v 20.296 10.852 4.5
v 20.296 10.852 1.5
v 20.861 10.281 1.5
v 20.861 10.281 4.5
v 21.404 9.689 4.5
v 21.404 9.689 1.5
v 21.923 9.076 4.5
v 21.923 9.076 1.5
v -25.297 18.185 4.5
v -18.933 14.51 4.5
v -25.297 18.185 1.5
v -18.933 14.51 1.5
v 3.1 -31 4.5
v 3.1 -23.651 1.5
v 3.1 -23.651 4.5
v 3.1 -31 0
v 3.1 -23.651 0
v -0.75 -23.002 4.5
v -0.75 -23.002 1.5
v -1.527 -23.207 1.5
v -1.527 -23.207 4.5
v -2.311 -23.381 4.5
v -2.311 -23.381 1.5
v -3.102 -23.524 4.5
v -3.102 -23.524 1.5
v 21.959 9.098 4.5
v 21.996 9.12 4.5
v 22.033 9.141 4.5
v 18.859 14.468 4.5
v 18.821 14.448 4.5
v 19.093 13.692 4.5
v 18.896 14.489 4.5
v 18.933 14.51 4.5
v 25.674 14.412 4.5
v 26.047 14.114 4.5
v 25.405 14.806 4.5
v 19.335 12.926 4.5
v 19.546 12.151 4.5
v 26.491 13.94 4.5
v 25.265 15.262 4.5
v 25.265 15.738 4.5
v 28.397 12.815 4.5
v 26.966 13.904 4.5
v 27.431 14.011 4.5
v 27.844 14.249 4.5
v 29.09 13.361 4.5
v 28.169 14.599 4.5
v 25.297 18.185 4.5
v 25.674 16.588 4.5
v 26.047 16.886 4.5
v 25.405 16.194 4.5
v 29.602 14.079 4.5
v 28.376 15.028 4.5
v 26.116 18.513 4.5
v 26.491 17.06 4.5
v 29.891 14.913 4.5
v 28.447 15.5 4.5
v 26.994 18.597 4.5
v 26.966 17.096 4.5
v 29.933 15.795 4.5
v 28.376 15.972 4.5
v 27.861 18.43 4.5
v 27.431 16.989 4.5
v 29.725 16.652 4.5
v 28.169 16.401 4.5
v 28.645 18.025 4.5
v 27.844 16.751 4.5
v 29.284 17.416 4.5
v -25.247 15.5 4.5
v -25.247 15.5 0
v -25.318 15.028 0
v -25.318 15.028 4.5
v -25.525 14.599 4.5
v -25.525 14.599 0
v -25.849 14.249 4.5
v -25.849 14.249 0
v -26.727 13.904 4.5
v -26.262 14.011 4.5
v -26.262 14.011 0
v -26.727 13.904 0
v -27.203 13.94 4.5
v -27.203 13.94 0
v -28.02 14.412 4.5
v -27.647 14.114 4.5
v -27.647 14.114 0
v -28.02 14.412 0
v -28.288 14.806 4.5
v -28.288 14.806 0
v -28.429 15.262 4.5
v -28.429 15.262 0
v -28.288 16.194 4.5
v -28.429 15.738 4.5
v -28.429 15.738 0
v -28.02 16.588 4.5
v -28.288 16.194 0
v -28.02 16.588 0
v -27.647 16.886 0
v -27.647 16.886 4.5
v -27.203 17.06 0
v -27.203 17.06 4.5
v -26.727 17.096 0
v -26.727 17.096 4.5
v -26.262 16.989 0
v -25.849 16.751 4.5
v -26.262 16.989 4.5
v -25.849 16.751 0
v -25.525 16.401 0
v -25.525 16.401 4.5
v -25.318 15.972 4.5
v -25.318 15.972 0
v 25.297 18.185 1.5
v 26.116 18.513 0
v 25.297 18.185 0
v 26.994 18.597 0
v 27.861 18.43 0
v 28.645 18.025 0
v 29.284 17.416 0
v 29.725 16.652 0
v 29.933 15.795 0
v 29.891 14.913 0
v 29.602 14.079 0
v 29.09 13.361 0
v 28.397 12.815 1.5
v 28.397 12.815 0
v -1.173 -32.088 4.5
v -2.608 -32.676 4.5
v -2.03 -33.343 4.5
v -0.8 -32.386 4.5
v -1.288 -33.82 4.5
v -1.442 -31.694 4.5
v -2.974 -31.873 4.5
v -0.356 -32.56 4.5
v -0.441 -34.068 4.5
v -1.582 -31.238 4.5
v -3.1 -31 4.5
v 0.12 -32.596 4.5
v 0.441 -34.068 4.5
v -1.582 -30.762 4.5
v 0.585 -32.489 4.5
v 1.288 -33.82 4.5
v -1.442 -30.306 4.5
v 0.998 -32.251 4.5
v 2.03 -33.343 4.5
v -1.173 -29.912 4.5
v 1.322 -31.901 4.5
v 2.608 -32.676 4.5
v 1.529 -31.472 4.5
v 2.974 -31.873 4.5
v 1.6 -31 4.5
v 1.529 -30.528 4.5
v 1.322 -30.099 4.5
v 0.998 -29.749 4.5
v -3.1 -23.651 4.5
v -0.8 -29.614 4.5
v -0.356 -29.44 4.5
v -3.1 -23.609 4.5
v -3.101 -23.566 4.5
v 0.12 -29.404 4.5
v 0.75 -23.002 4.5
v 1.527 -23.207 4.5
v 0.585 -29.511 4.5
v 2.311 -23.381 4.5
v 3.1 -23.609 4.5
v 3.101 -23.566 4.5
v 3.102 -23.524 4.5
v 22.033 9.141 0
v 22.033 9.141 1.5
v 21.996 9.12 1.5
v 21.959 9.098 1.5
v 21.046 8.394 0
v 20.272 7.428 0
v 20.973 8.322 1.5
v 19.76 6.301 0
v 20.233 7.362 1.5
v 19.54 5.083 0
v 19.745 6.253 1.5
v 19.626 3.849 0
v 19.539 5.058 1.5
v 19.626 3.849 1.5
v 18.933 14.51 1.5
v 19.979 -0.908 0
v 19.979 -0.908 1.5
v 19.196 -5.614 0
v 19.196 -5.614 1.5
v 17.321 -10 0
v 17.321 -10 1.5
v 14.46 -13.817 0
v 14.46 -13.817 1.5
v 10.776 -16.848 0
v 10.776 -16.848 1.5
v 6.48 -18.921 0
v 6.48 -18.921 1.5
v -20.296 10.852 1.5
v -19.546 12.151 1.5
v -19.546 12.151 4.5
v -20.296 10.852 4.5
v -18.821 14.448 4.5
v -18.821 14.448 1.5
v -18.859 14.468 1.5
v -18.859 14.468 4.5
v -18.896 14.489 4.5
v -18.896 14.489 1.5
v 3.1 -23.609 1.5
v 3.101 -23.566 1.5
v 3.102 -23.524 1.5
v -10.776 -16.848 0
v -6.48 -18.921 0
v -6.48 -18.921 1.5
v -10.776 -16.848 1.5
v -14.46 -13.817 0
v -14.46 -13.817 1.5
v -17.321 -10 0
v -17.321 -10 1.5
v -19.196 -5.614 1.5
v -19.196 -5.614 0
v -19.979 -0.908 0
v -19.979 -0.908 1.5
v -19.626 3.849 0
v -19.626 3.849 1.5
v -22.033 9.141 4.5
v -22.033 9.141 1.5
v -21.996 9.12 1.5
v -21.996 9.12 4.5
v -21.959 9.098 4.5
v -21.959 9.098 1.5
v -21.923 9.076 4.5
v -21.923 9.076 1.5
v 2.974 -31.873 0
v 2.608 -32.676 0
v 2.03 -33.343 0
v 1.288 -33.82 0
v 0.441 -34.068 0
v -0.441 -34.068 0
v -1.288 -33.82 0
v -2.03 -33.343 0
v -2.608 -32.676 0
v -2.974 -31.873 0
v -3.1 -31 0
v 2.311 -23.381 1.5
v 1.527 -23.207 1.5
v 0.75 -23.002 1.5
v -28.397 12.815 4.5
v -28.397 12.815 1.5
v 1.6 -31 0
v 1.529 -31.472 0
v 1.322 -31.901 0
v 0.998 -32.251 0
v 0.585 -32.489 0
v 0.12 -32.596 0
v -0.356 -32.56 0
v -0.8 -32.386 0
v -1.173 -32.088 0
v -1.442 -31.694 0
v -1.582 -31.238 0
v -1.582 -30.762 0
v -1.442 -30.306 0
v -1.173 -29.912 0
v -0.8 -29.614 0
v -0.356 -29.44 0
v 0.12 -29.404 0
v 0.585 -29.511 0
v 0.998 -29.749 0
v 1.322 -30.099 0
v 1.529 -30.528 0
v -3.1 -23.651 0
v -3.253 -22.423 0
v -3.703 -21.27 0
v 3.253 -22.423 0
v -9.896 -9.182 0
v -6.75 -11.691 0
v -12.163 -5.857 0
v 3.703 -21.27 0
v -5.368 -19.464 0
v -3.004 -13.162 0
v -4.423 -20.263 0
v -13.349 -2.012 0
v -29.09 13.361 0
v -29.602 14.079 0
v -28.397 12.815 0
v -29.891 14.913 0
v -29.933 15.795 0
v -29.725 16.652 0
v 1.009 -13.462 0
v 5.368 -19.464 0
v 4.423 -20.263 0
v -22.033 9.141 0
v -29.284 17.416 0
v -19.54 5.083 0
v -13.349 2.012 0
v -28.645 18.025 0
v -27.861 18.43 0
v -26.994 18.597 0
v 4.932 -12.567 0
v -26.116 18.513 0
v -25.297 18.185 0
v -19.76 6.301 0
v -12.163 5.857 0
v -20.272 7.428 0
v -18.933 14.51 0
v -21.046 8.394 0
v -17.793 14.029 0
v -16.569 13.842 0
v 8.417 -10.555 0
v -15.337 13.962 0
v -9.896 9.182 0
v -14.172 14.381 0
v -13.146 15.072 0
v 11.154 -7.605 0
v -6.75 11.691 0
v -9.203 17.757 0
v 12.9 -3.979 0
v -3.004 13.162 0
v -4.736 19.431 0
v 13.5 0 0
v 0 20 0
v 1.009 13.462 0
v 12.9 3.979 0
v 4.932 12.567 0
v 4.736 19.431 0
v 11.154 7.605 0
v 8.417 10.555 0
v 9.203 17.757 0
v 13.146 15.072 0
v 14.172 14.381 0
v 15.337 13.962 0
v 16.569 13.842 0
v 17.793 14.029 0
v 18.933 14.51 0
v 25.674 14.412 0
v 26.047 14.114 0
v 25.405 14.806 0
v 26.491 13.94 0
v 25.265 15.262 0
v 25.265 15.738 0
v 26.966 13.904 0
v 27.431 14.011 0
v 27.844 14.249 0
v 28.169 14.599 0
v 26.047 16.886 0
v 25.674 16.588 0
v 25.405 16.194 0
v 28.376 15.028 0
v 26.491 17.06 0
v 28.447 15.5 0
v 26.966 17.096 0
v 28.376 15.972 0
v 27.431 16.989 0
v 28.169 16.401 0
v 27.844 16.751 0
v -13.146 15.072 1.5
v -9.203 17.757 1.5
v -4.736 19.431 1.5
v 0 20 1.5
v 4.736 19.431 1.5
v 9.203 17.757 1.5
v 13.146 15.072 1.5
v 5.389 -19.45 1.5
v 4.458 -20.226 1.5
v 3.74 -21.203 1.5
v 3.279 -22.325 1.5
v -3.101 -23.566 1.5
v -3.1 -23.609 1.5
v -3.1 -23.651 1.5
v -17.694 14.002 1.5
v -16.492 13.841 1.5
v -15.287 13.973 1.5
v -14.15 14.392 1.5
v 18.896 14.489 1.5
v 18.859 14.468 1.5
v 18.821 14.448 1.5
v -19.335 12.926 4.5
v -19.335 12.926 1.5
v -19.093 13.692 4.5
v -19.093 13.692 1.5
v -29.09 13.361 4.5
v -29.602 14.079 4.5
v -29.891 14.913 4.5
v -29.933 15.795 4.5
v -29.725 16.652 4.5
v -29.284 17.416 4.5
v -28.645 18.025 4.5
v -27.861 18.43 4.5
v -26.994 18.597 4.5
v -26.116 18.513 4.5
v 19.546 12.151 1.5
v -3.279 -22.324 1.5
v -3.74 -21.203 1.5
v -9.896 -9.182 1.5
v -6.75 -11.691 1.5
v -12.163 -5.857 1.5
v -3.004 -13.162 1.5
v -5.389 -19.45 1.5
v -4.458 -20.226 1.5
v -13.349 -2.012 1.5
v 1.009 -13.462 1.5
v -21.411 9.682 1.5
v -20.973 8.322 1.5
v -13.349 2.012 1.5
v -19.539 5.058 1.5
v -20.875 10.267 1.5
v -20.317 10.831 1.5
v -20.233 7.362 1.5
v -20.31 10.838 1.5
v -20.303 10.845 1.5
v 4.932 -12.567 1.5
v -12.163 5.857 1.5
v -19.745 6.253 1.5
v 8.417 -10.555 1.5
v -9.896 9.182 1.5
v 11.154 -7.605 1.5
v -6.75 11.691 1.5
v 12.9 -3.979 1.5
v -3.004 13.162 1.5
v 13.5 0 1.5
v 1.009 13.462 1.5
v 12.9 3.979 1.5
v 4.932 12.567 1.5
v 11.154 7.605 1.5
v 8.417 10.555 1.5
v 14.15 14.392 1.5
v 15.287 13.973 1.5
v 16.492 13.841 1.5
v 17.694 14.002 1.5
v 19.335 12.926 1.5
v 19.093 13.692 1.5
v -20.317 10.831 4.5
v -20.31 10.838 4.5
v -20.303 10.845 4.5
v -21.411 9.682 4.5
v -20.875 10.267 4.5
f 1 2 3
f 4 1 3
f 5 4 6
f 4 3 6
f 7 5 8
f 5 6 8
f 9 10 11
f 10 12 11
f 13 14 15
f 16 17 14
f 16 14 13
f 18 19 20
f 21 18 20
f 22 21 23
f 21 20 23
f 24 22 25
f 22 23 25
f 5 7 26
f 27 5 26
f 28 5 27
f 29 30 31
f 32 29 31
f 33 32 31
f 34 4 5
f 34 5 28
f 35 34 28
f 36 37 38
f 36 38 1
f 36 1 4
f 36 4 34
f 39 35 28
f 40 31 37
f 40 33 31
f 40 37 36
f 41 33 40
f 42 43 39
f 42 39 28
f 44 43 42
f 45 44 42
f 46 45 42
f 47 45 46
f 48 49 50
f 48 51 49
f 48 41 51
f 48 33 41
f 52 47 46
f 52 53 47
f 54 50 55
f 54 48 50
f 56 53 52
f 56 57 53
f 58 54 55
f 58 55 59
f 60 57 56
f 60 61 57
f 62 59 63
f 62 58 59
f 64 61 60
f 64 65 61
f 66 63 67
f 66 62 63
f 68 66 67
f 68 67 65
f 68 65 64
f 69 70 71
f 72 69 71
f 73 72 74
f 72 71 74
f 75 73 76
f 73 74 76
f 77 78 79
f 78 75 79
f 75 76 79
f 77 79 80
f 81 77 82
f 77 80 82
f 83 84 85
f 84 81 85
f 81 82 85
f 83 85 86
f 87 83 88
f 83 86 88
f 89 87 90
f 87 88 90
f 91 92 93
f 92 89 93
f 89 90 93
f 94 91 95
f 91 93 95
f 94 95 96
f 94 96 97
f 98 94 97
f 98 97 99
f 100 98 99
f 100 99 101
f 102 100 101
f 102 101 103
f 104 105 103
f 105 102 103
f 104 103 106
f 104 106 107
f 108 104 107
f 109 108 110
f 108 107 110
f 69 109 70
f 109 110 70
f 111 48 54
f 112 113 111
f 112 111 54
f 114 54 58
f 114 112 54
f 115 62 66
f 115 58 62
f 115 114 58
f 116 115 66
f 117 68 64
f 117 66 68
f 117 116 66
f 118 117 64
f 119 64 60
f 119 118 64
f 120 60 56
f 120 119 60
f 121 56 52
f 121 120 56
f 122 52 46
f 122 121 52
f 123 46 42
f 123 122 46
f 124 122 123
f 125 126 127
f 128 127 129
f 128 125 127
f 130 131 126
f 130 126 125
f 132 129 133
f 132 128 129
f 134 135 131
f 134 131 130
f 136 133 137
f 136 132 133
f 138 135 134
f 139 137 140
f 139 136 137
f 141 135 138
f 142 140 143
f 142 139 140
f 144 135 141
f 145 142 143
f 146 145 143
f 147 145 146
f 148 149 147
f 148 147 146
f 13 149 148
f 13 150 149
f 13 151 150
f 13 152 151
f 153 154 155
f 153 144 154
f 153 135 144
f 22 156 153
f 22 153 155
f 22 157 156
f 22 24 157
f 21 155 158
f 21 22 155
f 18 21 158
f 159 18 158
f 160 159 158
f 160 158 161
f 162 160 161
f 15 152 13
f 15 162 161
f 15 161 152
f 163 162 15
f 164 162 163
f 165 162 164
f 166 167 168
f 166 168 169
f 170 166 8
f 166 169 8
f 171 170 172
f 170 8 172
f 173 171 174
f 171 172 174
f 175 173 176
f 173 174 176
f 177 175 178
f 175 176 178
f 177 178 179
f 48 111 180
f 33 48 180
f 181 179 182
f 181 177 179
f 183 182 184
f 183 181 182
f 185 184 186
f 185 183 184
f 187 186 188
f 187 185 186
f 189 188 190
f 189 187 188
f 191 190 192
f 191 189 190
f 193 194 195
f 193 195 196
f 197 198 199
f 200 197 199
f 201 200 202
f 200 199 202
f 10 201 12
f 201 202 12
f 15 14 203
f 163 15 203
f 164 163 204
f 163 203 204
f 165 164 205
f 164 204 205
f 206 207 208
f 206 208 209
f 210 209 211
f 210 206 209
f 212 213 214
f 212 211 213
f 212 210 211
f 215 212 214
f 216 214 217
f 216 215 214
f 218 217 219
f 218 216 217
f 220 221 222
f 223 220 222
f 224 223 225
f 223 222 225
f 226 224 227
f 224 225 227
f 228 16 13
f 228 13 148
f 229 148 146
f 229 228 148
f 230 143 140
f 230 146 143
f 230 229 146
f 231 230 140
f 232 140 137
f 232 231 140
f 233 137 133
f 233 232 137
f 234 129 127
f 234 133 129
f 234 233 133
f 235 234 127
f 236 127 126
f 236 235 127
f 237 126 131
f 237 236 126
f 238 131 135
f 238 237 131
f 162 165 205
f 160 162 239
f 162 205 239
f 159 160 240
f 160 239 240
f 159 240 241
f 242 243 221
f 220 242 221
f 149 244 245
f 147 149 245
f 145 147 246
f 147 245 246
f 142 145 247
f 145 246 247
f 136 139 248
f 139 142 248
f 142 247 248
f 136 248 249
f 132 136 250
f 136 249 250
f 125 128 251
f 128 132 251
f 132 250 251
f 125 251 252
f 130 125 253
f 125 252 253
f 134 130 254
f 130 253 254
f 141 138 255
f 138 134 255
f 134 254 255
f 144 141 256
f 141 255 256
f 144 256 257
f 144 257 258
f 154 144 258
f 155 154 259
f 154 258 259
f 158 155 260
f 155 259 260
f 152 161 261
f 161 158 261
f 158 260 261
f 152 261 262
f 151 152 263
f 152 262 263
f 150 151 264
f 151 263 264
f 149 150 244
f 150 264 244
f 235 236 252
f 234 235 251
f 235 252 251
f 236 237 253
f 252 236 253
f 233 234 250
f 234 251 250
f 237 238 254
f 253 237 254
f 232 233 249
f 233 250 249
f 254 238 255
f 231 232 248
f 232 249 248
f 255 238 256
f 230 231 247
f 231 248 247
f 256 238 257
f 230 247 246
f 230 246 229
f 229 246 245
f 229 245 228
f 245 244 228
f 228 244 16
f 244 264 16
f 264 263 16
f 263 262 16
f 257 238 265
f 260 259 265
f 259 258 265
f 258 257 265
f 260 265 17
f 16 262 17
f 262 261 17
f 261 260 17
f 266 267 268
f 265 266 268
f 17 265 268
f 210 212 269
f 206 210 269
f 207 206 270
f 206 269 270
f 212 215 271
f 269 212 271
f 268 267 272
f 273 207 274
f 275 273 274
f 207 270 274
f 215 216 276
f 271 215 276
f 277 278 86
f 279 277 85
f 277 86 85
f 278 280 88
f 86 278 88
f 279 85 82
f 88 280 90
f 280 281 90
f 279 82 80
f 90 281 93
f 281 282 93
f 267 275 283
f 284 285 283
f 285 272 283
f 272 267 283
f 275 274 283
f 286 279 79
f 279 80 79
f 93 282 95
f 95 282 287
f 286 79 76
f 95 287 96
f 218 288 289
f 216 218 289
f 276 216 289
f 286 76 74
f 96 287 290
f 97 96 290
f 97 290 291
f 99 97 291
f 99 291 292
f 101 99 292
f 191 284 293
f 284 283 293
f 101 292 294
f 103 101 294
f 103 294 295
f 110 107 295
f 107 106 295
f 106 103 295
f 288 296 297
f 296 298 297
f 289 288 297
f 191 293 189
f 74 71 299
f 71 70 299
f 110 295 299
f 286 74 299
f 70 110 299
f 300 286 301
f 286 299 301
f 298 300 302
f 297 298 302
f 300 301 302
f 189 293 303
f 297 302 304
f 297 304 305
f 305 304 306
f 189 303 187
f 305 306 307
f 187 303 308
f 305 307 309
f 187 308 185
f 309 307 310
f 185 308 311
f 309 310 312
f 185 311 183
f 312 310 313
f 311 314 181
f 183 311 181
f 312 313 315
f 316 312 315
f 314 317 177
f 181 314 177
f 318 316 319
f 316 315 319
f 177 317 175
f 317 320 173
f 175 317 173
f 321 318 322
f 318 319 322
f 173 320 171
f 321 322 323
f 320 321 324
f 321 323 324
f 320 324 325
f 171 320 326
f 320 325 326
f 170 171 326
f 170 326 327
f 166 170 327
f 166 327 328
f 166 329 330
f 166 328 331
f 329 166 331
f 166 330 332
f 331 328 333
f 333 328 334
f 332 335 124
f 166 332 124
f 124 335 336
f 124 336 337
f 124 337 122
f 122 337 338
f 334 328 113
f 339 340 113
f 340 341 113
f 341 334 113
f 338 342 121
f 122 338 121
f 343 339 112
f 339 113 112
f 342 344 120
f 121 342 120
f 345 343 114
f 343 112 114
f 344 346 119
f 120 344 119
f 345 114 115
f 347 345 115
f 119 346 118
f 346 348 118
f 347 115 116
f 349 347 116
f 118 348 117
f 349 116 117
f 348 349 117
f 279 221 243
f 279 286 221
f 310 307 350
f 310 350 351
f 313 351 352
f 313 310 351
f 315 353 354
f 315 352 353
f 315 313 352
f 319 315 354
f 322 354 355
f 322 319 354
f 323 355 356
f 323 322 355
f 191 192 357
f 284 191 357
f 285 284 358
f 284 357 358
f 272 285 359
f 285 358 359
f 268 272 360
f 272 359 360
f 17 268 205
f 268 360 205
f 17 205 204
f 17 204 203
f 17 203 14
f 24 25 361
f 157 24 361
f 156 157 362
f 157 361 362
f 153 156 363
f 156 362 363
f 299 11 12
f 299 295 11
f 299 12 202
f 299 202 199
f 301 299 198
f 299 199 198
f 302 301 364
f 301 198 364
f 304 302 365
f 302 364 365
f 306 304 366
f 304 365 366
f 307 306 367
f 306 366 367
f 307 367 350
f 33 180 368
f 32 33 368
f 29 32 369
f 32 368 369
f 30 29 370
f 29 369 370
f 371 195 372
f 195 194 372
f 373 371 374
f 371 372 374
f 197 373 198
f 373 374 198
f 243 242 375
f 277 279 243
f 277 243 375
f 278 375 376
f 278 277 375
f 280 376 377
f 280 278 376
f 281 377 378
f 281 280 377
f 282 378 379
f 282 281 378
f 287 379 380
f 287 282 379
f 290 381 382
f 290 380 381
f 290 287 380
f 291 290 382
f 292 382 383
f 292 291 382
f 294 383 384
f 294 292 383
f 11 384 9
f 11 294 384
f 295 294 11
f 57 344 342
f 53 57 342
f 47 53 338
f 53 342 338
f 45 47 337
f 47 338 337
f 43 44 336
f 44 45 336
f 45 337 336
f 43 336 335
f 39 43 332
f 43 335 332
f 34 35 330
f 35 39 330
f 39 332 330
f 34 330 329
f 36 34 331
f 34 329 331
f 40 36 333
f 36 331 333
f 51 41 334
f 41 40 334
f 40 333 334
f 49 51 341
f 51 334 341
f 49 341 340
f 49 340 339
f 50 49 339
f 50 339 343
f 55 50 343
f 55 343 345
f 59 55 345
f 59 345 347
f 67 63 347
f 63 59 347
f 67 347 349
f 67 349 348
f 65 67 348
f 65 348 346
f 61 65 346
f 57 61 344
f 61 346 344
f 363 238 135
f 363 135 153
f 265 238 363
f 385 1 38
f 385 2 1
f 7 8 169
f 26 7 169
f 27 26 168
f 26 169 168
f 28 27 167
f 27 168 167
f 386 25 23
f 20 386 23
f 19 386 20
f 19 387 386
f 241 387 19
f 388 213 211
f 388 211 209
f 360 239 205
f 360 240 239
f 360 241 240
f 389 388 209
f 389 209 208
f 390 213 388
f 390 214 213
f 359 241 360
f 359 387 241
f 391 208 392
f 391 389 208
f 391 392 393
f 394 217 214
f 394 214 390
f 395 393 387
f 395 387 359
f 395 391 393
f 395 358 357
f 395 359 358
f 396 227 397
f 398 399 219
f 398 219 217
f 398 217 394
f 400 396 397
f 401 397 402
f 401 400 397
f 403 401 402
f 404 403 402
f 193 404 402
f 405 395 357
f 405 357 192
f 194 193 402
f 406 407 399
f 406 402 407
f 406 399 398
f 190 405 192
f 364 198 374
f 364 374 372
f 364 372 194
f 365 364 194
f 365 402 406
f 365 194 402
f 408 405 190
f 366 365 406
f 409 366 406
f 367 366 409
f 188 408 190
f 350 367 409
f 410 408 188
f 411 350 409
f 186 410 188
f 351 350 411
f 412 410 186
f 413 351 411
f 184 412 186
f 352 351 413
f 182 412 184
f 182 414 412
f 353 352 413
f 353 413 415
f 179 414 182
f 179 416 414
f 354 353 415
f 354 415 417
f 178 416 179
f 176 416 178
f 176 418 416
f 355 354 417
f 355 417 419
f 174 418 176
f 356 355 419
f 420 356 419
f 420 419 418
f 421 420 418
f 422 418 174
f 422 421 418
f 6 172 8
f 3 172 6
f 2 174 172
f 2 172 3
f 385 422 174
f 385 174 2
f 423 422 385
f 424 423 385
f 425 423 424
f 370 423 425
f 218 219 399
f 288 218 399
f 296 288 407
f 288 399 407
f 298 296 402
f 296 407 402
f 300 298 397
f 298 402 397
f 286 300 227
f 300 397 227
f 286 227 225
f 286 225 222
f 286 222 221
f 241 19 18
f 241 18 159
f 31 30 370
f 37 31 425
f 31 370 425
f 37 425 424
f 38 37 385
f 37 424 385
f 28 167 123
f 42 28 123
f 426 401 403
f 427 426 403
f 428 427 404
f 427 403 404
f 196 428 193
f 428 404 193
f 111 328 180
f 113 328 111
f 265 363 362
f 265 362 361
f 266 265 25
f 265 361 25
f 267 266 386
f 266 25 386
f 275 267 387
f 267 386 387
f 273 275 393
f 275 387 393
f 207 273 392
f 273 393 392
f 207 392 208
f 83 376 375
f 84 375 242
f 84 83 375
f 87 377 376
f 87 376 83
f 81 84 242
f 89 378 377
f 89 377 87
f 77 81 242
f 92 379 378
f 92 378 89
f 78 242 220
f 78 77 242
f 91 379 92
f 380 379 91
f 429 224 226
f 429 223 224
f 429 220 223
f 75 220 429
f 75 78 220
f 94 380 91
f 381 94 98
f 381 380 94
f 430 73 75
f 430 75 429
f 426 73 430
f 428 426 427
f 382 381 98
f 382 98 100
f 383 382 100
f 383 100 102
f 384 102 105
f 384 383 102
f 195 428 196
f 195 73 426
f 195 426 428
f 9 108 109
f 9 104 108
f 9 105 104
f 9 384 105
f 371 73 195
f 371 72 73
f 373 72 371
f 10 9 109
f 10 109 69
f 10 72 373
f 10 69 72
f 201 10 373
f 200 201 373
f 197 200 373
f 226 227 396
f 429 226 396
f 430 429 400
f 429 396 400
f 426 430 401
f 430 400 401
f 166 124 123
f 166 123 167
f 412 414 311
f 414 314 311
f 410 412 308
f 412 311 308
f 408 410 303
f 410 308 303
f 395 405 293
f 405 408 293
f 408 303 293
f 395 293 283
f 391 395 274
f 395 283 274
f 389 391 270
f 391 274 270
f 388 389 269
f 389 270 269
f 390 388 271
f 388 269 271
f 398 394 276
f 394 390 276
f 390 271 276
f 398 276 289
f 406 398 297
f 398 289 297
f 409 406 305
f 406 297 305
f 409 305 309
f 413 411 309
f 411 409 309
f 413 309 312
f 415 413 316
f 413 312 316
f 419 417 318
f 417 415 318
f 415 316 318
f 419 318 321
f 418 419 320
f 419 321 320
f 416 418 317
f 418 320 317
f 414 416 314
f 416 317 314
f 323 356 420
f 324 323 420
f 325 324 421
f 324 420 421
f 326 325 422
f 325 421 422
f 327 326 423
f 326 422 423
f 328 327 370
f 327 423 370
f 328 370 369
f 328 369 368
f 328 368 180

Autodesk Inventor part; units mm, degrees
ref_plane "YZ Plane" through (0, 0, 0) normal (1, 0, 0) x (0, 1, 0)
ref_plane "XZ Plane" through (0, 0, 0) normal (0, 1, 0) x (-1, 0, 0)
ref_plane "XY Plane" through (0, 0, 0) normal (0, 0, 1) x (1, 0, 0)
sketch "Sketch1" plane through (0, 0, 0) normal (0, 0, 1) x (1, 0, 0)
  circle A0 centre (0, -31) radius 1.6
  circle A1 centre (0, 0) radius 13.5
  circle A2 centre (0, 0) radius 20
  line L0 (0, 0) -> (0, -31) construction
  line L1 (0, -31) -> (0, -7.0396) construction
  line L2 (-3.1, -31) -> (-3.1, -19.7583)
  arc A3 (-3.1, -31) -> (3.1, -31) centre (0, -31) ccw
  line L3 (3.1, -19.7583) -> (3.1, -31)
  circle A4 centre (26.8468, 15.5) radius 1.6
  line L4 (0, 0) -> (26.8468, 15.5) construction
  line L5 (26.8468, 15.5) -> (6.0965, 3.5198) construction
  line L6 (28.3968, 12.8153) -> (18.6612, 7.1945)
  arc A5 (28.3968, 12.8153) -> (25.2968, 18.1847) centre (26.8468, 15.5) ccw
  line L7 (15.5612, 12.5638) -> (25.2968, 18.1847)
  circle A6 centre (-26.8468, 15.5) radius 1.6
  line L8 (0, 0) -> (-26.8468, 15.5) construction
  line L9 (-26.8468, 15.5) -> (-6.0965, 3.5198) construction
  line L10 (-25.2968, 18.1847) -> (-15.5612, 12.5638)
  arc A7 (-25.2968, 18.1847) -> (-28.3968, 12.8153) centre (-26.8468, 15.5) ccw
  line L11 (-18.6612, 7.1945) -> (-28.3968, 12.8153)
  point P0 (18.6612, 7.1945)
  point P1 (15.5612, 12.5638)
  dimension "d4" = 31
  dimension "d5" = 3.2
  dimension "d6" = 27
  dimension "d7" = 40
  dimension "d8" = 1.5
  dimension "d11" = 360
extrude "Extrusion1" add sketch "Sketch1" along normal blind 1.5
fillet "Fillet1" radius 5 6 edges at (-15.5612, 12.5638, 0.75) (15.5612, 12.5638, 0.75) (18.6612, 7.1945, 0.75) (-18.6612, 7.1945, 0.75) (-3.1, -19.7583, 0.75) (3.1, -19.7583, 0.75)
sketch "Sketch2" plane through (0, 0, 1.5) normal (0, 0, 1) x (1, 0, 0)
  arc A0 (-20.2121, 10.7235) -> (-0.8192, -22.866) centre (-6.2805, -3.626) ccw construction
  arc A1 (0.8192, -22.866) -> (20.2121, 10.7235) centre (6.2805, -3.626) ccw construction
  circle A2 centre (0, 0) radius 13.5 construction
  arc A3 (-20.3166, 10.8312) -> (-0.75, -23.0022) centre (-6.2805, -3.626) ccw
  arc A4 (0.75, -23.0022) -> (19.7139, 11.3928) centre (6.2805, -3.626) ccw
  line L0 (-0.75, -23.0022) -> (0.75, -23.0022)
  line L1 (25.2968, 18.1847) -> (18.9327, 14.5104) projected
  arc A5 (13.1462, 15.0724) -> (18.9327, 14.5104) centre (16.4327, 18.8405) ccw projected
  arc A6 (13.1462, 15.0724) -> (-13.1462, 15.0724) centre (0, 0) ccw projected
  arc A7 (-18.9327, 14.5104) -> (-13.1462, 15.0724) centre (-16.4327, 18.8405) ccw projected
  line L2 (-18.9327, 14.5104) -> (-25.2968, 18.1847) projected
  arc A8 (-25.2968, 18.1847) -> (-28.3968, 12.8153) centre (-26.8468, 15.5) ccw projected
  line L3 (-28.3968, 12.8153) -> (-22.0327, 9.141) projected
  arc A9 (-19.6262, 3.8487) -> (-22.0327, 9.141) centre (-24.5327, 4.8109) ccw projected
  arc A10 (-19.6262, 3.8487) -> (-6.48, -18.9211) centre (0, 0) ccw projected
  arc A11 (-3.1, -23.6514) -> (-6.48, -18.9211) centre (-8.1, -23.6514) ccw projected
  line L4 (-3.1, -23.6514) -> (-3.1, -31) projected
  arc A12 (-3.1, -31) -> (3.1, -31) centre (0, -31) ccw projected
  line L5 (3.1, -31) -> (3.1, -23.6514) projected
  arc A13 (6.48, -18.9211) -> (3.1, -23.6514) centre (8.1, -23.6514) ccw projected
  arc A14 (6.48, -18.9211) -> (19.6262, 3.8487) centre (0, 0) ccw projected
  arc A15 (22.0327, 9.141) -> (19.6262, 3.8487) centre (24.5327, 4.8109) ccw projected
  line L6 (22.0327, 9.141) -> (28.3968, 12.8153) projected
  arc A16 (28.3968, 12.8153) -> (25.2968, 18.1847) centre (26.8468, 15.5) ccw projected
  circle A17 centre (0, -31) radius 1.6 projected
  circle A18 centre (0, 0) radius 13.5 projected
  circle A19 centre (26.8468, 15.5) radius 1.6 projected
  circle A20 centre (-26.8468, 15.5) radius 1.6 projected
  arc A21 (19.5455, 12.1506) -> (-19.7234, 11.3763) centre (0, 7.2521) ccw
  arc A22 (0.7782, -23.0103) -> (20.2955, 10.8516) centre (6.2805, -3.626) ccw
  line L7 (20.2955, 10.8516) -> (19.5455, 12.1506)
  arc A23 (-20.2955, 10.8516) -> (0.0095, -22.7691) centre (-6.2805, -3.626) ccw
  arc A24 (19.5383, 12.1791) -> (-19.5455, 12.1506) centre (0, 7.2521) ccw
  line L8 (-19.5455, 12.1506) -> (-20.2955, 10.8516)
  point P0 (3.1016, -23.5237)
  point P1 (-3.1016, -23.5237)
  point P2 (18.8213, 14.4479)
  point P3 (20.2955, 10.8516)
  point P4 (21.9229, 9.0758)
  point P5 (-21.9229, 9.0758)
  point P6 (-20.3166, 10.8312)
  point P7 (-19.5455, 12.1506)
  point P8 (-18.8213, 14.4479)
  dimension "d16" = 0.15
  dimension "d17" = 0.15
  dimension "d18" = 1.5
  dimension "d21" = 360
extrude "Extrusion2" add sketch "Sketch2" along normal blind 3 contours A3 A9 L3 A8 L2 A7 A21 L8 A23 | A3 L0 A4 A13 L5 A12 L4 A11 | A5 L1 A16 L6 A15 A4 L7 A21
properties part number "Bracket"
